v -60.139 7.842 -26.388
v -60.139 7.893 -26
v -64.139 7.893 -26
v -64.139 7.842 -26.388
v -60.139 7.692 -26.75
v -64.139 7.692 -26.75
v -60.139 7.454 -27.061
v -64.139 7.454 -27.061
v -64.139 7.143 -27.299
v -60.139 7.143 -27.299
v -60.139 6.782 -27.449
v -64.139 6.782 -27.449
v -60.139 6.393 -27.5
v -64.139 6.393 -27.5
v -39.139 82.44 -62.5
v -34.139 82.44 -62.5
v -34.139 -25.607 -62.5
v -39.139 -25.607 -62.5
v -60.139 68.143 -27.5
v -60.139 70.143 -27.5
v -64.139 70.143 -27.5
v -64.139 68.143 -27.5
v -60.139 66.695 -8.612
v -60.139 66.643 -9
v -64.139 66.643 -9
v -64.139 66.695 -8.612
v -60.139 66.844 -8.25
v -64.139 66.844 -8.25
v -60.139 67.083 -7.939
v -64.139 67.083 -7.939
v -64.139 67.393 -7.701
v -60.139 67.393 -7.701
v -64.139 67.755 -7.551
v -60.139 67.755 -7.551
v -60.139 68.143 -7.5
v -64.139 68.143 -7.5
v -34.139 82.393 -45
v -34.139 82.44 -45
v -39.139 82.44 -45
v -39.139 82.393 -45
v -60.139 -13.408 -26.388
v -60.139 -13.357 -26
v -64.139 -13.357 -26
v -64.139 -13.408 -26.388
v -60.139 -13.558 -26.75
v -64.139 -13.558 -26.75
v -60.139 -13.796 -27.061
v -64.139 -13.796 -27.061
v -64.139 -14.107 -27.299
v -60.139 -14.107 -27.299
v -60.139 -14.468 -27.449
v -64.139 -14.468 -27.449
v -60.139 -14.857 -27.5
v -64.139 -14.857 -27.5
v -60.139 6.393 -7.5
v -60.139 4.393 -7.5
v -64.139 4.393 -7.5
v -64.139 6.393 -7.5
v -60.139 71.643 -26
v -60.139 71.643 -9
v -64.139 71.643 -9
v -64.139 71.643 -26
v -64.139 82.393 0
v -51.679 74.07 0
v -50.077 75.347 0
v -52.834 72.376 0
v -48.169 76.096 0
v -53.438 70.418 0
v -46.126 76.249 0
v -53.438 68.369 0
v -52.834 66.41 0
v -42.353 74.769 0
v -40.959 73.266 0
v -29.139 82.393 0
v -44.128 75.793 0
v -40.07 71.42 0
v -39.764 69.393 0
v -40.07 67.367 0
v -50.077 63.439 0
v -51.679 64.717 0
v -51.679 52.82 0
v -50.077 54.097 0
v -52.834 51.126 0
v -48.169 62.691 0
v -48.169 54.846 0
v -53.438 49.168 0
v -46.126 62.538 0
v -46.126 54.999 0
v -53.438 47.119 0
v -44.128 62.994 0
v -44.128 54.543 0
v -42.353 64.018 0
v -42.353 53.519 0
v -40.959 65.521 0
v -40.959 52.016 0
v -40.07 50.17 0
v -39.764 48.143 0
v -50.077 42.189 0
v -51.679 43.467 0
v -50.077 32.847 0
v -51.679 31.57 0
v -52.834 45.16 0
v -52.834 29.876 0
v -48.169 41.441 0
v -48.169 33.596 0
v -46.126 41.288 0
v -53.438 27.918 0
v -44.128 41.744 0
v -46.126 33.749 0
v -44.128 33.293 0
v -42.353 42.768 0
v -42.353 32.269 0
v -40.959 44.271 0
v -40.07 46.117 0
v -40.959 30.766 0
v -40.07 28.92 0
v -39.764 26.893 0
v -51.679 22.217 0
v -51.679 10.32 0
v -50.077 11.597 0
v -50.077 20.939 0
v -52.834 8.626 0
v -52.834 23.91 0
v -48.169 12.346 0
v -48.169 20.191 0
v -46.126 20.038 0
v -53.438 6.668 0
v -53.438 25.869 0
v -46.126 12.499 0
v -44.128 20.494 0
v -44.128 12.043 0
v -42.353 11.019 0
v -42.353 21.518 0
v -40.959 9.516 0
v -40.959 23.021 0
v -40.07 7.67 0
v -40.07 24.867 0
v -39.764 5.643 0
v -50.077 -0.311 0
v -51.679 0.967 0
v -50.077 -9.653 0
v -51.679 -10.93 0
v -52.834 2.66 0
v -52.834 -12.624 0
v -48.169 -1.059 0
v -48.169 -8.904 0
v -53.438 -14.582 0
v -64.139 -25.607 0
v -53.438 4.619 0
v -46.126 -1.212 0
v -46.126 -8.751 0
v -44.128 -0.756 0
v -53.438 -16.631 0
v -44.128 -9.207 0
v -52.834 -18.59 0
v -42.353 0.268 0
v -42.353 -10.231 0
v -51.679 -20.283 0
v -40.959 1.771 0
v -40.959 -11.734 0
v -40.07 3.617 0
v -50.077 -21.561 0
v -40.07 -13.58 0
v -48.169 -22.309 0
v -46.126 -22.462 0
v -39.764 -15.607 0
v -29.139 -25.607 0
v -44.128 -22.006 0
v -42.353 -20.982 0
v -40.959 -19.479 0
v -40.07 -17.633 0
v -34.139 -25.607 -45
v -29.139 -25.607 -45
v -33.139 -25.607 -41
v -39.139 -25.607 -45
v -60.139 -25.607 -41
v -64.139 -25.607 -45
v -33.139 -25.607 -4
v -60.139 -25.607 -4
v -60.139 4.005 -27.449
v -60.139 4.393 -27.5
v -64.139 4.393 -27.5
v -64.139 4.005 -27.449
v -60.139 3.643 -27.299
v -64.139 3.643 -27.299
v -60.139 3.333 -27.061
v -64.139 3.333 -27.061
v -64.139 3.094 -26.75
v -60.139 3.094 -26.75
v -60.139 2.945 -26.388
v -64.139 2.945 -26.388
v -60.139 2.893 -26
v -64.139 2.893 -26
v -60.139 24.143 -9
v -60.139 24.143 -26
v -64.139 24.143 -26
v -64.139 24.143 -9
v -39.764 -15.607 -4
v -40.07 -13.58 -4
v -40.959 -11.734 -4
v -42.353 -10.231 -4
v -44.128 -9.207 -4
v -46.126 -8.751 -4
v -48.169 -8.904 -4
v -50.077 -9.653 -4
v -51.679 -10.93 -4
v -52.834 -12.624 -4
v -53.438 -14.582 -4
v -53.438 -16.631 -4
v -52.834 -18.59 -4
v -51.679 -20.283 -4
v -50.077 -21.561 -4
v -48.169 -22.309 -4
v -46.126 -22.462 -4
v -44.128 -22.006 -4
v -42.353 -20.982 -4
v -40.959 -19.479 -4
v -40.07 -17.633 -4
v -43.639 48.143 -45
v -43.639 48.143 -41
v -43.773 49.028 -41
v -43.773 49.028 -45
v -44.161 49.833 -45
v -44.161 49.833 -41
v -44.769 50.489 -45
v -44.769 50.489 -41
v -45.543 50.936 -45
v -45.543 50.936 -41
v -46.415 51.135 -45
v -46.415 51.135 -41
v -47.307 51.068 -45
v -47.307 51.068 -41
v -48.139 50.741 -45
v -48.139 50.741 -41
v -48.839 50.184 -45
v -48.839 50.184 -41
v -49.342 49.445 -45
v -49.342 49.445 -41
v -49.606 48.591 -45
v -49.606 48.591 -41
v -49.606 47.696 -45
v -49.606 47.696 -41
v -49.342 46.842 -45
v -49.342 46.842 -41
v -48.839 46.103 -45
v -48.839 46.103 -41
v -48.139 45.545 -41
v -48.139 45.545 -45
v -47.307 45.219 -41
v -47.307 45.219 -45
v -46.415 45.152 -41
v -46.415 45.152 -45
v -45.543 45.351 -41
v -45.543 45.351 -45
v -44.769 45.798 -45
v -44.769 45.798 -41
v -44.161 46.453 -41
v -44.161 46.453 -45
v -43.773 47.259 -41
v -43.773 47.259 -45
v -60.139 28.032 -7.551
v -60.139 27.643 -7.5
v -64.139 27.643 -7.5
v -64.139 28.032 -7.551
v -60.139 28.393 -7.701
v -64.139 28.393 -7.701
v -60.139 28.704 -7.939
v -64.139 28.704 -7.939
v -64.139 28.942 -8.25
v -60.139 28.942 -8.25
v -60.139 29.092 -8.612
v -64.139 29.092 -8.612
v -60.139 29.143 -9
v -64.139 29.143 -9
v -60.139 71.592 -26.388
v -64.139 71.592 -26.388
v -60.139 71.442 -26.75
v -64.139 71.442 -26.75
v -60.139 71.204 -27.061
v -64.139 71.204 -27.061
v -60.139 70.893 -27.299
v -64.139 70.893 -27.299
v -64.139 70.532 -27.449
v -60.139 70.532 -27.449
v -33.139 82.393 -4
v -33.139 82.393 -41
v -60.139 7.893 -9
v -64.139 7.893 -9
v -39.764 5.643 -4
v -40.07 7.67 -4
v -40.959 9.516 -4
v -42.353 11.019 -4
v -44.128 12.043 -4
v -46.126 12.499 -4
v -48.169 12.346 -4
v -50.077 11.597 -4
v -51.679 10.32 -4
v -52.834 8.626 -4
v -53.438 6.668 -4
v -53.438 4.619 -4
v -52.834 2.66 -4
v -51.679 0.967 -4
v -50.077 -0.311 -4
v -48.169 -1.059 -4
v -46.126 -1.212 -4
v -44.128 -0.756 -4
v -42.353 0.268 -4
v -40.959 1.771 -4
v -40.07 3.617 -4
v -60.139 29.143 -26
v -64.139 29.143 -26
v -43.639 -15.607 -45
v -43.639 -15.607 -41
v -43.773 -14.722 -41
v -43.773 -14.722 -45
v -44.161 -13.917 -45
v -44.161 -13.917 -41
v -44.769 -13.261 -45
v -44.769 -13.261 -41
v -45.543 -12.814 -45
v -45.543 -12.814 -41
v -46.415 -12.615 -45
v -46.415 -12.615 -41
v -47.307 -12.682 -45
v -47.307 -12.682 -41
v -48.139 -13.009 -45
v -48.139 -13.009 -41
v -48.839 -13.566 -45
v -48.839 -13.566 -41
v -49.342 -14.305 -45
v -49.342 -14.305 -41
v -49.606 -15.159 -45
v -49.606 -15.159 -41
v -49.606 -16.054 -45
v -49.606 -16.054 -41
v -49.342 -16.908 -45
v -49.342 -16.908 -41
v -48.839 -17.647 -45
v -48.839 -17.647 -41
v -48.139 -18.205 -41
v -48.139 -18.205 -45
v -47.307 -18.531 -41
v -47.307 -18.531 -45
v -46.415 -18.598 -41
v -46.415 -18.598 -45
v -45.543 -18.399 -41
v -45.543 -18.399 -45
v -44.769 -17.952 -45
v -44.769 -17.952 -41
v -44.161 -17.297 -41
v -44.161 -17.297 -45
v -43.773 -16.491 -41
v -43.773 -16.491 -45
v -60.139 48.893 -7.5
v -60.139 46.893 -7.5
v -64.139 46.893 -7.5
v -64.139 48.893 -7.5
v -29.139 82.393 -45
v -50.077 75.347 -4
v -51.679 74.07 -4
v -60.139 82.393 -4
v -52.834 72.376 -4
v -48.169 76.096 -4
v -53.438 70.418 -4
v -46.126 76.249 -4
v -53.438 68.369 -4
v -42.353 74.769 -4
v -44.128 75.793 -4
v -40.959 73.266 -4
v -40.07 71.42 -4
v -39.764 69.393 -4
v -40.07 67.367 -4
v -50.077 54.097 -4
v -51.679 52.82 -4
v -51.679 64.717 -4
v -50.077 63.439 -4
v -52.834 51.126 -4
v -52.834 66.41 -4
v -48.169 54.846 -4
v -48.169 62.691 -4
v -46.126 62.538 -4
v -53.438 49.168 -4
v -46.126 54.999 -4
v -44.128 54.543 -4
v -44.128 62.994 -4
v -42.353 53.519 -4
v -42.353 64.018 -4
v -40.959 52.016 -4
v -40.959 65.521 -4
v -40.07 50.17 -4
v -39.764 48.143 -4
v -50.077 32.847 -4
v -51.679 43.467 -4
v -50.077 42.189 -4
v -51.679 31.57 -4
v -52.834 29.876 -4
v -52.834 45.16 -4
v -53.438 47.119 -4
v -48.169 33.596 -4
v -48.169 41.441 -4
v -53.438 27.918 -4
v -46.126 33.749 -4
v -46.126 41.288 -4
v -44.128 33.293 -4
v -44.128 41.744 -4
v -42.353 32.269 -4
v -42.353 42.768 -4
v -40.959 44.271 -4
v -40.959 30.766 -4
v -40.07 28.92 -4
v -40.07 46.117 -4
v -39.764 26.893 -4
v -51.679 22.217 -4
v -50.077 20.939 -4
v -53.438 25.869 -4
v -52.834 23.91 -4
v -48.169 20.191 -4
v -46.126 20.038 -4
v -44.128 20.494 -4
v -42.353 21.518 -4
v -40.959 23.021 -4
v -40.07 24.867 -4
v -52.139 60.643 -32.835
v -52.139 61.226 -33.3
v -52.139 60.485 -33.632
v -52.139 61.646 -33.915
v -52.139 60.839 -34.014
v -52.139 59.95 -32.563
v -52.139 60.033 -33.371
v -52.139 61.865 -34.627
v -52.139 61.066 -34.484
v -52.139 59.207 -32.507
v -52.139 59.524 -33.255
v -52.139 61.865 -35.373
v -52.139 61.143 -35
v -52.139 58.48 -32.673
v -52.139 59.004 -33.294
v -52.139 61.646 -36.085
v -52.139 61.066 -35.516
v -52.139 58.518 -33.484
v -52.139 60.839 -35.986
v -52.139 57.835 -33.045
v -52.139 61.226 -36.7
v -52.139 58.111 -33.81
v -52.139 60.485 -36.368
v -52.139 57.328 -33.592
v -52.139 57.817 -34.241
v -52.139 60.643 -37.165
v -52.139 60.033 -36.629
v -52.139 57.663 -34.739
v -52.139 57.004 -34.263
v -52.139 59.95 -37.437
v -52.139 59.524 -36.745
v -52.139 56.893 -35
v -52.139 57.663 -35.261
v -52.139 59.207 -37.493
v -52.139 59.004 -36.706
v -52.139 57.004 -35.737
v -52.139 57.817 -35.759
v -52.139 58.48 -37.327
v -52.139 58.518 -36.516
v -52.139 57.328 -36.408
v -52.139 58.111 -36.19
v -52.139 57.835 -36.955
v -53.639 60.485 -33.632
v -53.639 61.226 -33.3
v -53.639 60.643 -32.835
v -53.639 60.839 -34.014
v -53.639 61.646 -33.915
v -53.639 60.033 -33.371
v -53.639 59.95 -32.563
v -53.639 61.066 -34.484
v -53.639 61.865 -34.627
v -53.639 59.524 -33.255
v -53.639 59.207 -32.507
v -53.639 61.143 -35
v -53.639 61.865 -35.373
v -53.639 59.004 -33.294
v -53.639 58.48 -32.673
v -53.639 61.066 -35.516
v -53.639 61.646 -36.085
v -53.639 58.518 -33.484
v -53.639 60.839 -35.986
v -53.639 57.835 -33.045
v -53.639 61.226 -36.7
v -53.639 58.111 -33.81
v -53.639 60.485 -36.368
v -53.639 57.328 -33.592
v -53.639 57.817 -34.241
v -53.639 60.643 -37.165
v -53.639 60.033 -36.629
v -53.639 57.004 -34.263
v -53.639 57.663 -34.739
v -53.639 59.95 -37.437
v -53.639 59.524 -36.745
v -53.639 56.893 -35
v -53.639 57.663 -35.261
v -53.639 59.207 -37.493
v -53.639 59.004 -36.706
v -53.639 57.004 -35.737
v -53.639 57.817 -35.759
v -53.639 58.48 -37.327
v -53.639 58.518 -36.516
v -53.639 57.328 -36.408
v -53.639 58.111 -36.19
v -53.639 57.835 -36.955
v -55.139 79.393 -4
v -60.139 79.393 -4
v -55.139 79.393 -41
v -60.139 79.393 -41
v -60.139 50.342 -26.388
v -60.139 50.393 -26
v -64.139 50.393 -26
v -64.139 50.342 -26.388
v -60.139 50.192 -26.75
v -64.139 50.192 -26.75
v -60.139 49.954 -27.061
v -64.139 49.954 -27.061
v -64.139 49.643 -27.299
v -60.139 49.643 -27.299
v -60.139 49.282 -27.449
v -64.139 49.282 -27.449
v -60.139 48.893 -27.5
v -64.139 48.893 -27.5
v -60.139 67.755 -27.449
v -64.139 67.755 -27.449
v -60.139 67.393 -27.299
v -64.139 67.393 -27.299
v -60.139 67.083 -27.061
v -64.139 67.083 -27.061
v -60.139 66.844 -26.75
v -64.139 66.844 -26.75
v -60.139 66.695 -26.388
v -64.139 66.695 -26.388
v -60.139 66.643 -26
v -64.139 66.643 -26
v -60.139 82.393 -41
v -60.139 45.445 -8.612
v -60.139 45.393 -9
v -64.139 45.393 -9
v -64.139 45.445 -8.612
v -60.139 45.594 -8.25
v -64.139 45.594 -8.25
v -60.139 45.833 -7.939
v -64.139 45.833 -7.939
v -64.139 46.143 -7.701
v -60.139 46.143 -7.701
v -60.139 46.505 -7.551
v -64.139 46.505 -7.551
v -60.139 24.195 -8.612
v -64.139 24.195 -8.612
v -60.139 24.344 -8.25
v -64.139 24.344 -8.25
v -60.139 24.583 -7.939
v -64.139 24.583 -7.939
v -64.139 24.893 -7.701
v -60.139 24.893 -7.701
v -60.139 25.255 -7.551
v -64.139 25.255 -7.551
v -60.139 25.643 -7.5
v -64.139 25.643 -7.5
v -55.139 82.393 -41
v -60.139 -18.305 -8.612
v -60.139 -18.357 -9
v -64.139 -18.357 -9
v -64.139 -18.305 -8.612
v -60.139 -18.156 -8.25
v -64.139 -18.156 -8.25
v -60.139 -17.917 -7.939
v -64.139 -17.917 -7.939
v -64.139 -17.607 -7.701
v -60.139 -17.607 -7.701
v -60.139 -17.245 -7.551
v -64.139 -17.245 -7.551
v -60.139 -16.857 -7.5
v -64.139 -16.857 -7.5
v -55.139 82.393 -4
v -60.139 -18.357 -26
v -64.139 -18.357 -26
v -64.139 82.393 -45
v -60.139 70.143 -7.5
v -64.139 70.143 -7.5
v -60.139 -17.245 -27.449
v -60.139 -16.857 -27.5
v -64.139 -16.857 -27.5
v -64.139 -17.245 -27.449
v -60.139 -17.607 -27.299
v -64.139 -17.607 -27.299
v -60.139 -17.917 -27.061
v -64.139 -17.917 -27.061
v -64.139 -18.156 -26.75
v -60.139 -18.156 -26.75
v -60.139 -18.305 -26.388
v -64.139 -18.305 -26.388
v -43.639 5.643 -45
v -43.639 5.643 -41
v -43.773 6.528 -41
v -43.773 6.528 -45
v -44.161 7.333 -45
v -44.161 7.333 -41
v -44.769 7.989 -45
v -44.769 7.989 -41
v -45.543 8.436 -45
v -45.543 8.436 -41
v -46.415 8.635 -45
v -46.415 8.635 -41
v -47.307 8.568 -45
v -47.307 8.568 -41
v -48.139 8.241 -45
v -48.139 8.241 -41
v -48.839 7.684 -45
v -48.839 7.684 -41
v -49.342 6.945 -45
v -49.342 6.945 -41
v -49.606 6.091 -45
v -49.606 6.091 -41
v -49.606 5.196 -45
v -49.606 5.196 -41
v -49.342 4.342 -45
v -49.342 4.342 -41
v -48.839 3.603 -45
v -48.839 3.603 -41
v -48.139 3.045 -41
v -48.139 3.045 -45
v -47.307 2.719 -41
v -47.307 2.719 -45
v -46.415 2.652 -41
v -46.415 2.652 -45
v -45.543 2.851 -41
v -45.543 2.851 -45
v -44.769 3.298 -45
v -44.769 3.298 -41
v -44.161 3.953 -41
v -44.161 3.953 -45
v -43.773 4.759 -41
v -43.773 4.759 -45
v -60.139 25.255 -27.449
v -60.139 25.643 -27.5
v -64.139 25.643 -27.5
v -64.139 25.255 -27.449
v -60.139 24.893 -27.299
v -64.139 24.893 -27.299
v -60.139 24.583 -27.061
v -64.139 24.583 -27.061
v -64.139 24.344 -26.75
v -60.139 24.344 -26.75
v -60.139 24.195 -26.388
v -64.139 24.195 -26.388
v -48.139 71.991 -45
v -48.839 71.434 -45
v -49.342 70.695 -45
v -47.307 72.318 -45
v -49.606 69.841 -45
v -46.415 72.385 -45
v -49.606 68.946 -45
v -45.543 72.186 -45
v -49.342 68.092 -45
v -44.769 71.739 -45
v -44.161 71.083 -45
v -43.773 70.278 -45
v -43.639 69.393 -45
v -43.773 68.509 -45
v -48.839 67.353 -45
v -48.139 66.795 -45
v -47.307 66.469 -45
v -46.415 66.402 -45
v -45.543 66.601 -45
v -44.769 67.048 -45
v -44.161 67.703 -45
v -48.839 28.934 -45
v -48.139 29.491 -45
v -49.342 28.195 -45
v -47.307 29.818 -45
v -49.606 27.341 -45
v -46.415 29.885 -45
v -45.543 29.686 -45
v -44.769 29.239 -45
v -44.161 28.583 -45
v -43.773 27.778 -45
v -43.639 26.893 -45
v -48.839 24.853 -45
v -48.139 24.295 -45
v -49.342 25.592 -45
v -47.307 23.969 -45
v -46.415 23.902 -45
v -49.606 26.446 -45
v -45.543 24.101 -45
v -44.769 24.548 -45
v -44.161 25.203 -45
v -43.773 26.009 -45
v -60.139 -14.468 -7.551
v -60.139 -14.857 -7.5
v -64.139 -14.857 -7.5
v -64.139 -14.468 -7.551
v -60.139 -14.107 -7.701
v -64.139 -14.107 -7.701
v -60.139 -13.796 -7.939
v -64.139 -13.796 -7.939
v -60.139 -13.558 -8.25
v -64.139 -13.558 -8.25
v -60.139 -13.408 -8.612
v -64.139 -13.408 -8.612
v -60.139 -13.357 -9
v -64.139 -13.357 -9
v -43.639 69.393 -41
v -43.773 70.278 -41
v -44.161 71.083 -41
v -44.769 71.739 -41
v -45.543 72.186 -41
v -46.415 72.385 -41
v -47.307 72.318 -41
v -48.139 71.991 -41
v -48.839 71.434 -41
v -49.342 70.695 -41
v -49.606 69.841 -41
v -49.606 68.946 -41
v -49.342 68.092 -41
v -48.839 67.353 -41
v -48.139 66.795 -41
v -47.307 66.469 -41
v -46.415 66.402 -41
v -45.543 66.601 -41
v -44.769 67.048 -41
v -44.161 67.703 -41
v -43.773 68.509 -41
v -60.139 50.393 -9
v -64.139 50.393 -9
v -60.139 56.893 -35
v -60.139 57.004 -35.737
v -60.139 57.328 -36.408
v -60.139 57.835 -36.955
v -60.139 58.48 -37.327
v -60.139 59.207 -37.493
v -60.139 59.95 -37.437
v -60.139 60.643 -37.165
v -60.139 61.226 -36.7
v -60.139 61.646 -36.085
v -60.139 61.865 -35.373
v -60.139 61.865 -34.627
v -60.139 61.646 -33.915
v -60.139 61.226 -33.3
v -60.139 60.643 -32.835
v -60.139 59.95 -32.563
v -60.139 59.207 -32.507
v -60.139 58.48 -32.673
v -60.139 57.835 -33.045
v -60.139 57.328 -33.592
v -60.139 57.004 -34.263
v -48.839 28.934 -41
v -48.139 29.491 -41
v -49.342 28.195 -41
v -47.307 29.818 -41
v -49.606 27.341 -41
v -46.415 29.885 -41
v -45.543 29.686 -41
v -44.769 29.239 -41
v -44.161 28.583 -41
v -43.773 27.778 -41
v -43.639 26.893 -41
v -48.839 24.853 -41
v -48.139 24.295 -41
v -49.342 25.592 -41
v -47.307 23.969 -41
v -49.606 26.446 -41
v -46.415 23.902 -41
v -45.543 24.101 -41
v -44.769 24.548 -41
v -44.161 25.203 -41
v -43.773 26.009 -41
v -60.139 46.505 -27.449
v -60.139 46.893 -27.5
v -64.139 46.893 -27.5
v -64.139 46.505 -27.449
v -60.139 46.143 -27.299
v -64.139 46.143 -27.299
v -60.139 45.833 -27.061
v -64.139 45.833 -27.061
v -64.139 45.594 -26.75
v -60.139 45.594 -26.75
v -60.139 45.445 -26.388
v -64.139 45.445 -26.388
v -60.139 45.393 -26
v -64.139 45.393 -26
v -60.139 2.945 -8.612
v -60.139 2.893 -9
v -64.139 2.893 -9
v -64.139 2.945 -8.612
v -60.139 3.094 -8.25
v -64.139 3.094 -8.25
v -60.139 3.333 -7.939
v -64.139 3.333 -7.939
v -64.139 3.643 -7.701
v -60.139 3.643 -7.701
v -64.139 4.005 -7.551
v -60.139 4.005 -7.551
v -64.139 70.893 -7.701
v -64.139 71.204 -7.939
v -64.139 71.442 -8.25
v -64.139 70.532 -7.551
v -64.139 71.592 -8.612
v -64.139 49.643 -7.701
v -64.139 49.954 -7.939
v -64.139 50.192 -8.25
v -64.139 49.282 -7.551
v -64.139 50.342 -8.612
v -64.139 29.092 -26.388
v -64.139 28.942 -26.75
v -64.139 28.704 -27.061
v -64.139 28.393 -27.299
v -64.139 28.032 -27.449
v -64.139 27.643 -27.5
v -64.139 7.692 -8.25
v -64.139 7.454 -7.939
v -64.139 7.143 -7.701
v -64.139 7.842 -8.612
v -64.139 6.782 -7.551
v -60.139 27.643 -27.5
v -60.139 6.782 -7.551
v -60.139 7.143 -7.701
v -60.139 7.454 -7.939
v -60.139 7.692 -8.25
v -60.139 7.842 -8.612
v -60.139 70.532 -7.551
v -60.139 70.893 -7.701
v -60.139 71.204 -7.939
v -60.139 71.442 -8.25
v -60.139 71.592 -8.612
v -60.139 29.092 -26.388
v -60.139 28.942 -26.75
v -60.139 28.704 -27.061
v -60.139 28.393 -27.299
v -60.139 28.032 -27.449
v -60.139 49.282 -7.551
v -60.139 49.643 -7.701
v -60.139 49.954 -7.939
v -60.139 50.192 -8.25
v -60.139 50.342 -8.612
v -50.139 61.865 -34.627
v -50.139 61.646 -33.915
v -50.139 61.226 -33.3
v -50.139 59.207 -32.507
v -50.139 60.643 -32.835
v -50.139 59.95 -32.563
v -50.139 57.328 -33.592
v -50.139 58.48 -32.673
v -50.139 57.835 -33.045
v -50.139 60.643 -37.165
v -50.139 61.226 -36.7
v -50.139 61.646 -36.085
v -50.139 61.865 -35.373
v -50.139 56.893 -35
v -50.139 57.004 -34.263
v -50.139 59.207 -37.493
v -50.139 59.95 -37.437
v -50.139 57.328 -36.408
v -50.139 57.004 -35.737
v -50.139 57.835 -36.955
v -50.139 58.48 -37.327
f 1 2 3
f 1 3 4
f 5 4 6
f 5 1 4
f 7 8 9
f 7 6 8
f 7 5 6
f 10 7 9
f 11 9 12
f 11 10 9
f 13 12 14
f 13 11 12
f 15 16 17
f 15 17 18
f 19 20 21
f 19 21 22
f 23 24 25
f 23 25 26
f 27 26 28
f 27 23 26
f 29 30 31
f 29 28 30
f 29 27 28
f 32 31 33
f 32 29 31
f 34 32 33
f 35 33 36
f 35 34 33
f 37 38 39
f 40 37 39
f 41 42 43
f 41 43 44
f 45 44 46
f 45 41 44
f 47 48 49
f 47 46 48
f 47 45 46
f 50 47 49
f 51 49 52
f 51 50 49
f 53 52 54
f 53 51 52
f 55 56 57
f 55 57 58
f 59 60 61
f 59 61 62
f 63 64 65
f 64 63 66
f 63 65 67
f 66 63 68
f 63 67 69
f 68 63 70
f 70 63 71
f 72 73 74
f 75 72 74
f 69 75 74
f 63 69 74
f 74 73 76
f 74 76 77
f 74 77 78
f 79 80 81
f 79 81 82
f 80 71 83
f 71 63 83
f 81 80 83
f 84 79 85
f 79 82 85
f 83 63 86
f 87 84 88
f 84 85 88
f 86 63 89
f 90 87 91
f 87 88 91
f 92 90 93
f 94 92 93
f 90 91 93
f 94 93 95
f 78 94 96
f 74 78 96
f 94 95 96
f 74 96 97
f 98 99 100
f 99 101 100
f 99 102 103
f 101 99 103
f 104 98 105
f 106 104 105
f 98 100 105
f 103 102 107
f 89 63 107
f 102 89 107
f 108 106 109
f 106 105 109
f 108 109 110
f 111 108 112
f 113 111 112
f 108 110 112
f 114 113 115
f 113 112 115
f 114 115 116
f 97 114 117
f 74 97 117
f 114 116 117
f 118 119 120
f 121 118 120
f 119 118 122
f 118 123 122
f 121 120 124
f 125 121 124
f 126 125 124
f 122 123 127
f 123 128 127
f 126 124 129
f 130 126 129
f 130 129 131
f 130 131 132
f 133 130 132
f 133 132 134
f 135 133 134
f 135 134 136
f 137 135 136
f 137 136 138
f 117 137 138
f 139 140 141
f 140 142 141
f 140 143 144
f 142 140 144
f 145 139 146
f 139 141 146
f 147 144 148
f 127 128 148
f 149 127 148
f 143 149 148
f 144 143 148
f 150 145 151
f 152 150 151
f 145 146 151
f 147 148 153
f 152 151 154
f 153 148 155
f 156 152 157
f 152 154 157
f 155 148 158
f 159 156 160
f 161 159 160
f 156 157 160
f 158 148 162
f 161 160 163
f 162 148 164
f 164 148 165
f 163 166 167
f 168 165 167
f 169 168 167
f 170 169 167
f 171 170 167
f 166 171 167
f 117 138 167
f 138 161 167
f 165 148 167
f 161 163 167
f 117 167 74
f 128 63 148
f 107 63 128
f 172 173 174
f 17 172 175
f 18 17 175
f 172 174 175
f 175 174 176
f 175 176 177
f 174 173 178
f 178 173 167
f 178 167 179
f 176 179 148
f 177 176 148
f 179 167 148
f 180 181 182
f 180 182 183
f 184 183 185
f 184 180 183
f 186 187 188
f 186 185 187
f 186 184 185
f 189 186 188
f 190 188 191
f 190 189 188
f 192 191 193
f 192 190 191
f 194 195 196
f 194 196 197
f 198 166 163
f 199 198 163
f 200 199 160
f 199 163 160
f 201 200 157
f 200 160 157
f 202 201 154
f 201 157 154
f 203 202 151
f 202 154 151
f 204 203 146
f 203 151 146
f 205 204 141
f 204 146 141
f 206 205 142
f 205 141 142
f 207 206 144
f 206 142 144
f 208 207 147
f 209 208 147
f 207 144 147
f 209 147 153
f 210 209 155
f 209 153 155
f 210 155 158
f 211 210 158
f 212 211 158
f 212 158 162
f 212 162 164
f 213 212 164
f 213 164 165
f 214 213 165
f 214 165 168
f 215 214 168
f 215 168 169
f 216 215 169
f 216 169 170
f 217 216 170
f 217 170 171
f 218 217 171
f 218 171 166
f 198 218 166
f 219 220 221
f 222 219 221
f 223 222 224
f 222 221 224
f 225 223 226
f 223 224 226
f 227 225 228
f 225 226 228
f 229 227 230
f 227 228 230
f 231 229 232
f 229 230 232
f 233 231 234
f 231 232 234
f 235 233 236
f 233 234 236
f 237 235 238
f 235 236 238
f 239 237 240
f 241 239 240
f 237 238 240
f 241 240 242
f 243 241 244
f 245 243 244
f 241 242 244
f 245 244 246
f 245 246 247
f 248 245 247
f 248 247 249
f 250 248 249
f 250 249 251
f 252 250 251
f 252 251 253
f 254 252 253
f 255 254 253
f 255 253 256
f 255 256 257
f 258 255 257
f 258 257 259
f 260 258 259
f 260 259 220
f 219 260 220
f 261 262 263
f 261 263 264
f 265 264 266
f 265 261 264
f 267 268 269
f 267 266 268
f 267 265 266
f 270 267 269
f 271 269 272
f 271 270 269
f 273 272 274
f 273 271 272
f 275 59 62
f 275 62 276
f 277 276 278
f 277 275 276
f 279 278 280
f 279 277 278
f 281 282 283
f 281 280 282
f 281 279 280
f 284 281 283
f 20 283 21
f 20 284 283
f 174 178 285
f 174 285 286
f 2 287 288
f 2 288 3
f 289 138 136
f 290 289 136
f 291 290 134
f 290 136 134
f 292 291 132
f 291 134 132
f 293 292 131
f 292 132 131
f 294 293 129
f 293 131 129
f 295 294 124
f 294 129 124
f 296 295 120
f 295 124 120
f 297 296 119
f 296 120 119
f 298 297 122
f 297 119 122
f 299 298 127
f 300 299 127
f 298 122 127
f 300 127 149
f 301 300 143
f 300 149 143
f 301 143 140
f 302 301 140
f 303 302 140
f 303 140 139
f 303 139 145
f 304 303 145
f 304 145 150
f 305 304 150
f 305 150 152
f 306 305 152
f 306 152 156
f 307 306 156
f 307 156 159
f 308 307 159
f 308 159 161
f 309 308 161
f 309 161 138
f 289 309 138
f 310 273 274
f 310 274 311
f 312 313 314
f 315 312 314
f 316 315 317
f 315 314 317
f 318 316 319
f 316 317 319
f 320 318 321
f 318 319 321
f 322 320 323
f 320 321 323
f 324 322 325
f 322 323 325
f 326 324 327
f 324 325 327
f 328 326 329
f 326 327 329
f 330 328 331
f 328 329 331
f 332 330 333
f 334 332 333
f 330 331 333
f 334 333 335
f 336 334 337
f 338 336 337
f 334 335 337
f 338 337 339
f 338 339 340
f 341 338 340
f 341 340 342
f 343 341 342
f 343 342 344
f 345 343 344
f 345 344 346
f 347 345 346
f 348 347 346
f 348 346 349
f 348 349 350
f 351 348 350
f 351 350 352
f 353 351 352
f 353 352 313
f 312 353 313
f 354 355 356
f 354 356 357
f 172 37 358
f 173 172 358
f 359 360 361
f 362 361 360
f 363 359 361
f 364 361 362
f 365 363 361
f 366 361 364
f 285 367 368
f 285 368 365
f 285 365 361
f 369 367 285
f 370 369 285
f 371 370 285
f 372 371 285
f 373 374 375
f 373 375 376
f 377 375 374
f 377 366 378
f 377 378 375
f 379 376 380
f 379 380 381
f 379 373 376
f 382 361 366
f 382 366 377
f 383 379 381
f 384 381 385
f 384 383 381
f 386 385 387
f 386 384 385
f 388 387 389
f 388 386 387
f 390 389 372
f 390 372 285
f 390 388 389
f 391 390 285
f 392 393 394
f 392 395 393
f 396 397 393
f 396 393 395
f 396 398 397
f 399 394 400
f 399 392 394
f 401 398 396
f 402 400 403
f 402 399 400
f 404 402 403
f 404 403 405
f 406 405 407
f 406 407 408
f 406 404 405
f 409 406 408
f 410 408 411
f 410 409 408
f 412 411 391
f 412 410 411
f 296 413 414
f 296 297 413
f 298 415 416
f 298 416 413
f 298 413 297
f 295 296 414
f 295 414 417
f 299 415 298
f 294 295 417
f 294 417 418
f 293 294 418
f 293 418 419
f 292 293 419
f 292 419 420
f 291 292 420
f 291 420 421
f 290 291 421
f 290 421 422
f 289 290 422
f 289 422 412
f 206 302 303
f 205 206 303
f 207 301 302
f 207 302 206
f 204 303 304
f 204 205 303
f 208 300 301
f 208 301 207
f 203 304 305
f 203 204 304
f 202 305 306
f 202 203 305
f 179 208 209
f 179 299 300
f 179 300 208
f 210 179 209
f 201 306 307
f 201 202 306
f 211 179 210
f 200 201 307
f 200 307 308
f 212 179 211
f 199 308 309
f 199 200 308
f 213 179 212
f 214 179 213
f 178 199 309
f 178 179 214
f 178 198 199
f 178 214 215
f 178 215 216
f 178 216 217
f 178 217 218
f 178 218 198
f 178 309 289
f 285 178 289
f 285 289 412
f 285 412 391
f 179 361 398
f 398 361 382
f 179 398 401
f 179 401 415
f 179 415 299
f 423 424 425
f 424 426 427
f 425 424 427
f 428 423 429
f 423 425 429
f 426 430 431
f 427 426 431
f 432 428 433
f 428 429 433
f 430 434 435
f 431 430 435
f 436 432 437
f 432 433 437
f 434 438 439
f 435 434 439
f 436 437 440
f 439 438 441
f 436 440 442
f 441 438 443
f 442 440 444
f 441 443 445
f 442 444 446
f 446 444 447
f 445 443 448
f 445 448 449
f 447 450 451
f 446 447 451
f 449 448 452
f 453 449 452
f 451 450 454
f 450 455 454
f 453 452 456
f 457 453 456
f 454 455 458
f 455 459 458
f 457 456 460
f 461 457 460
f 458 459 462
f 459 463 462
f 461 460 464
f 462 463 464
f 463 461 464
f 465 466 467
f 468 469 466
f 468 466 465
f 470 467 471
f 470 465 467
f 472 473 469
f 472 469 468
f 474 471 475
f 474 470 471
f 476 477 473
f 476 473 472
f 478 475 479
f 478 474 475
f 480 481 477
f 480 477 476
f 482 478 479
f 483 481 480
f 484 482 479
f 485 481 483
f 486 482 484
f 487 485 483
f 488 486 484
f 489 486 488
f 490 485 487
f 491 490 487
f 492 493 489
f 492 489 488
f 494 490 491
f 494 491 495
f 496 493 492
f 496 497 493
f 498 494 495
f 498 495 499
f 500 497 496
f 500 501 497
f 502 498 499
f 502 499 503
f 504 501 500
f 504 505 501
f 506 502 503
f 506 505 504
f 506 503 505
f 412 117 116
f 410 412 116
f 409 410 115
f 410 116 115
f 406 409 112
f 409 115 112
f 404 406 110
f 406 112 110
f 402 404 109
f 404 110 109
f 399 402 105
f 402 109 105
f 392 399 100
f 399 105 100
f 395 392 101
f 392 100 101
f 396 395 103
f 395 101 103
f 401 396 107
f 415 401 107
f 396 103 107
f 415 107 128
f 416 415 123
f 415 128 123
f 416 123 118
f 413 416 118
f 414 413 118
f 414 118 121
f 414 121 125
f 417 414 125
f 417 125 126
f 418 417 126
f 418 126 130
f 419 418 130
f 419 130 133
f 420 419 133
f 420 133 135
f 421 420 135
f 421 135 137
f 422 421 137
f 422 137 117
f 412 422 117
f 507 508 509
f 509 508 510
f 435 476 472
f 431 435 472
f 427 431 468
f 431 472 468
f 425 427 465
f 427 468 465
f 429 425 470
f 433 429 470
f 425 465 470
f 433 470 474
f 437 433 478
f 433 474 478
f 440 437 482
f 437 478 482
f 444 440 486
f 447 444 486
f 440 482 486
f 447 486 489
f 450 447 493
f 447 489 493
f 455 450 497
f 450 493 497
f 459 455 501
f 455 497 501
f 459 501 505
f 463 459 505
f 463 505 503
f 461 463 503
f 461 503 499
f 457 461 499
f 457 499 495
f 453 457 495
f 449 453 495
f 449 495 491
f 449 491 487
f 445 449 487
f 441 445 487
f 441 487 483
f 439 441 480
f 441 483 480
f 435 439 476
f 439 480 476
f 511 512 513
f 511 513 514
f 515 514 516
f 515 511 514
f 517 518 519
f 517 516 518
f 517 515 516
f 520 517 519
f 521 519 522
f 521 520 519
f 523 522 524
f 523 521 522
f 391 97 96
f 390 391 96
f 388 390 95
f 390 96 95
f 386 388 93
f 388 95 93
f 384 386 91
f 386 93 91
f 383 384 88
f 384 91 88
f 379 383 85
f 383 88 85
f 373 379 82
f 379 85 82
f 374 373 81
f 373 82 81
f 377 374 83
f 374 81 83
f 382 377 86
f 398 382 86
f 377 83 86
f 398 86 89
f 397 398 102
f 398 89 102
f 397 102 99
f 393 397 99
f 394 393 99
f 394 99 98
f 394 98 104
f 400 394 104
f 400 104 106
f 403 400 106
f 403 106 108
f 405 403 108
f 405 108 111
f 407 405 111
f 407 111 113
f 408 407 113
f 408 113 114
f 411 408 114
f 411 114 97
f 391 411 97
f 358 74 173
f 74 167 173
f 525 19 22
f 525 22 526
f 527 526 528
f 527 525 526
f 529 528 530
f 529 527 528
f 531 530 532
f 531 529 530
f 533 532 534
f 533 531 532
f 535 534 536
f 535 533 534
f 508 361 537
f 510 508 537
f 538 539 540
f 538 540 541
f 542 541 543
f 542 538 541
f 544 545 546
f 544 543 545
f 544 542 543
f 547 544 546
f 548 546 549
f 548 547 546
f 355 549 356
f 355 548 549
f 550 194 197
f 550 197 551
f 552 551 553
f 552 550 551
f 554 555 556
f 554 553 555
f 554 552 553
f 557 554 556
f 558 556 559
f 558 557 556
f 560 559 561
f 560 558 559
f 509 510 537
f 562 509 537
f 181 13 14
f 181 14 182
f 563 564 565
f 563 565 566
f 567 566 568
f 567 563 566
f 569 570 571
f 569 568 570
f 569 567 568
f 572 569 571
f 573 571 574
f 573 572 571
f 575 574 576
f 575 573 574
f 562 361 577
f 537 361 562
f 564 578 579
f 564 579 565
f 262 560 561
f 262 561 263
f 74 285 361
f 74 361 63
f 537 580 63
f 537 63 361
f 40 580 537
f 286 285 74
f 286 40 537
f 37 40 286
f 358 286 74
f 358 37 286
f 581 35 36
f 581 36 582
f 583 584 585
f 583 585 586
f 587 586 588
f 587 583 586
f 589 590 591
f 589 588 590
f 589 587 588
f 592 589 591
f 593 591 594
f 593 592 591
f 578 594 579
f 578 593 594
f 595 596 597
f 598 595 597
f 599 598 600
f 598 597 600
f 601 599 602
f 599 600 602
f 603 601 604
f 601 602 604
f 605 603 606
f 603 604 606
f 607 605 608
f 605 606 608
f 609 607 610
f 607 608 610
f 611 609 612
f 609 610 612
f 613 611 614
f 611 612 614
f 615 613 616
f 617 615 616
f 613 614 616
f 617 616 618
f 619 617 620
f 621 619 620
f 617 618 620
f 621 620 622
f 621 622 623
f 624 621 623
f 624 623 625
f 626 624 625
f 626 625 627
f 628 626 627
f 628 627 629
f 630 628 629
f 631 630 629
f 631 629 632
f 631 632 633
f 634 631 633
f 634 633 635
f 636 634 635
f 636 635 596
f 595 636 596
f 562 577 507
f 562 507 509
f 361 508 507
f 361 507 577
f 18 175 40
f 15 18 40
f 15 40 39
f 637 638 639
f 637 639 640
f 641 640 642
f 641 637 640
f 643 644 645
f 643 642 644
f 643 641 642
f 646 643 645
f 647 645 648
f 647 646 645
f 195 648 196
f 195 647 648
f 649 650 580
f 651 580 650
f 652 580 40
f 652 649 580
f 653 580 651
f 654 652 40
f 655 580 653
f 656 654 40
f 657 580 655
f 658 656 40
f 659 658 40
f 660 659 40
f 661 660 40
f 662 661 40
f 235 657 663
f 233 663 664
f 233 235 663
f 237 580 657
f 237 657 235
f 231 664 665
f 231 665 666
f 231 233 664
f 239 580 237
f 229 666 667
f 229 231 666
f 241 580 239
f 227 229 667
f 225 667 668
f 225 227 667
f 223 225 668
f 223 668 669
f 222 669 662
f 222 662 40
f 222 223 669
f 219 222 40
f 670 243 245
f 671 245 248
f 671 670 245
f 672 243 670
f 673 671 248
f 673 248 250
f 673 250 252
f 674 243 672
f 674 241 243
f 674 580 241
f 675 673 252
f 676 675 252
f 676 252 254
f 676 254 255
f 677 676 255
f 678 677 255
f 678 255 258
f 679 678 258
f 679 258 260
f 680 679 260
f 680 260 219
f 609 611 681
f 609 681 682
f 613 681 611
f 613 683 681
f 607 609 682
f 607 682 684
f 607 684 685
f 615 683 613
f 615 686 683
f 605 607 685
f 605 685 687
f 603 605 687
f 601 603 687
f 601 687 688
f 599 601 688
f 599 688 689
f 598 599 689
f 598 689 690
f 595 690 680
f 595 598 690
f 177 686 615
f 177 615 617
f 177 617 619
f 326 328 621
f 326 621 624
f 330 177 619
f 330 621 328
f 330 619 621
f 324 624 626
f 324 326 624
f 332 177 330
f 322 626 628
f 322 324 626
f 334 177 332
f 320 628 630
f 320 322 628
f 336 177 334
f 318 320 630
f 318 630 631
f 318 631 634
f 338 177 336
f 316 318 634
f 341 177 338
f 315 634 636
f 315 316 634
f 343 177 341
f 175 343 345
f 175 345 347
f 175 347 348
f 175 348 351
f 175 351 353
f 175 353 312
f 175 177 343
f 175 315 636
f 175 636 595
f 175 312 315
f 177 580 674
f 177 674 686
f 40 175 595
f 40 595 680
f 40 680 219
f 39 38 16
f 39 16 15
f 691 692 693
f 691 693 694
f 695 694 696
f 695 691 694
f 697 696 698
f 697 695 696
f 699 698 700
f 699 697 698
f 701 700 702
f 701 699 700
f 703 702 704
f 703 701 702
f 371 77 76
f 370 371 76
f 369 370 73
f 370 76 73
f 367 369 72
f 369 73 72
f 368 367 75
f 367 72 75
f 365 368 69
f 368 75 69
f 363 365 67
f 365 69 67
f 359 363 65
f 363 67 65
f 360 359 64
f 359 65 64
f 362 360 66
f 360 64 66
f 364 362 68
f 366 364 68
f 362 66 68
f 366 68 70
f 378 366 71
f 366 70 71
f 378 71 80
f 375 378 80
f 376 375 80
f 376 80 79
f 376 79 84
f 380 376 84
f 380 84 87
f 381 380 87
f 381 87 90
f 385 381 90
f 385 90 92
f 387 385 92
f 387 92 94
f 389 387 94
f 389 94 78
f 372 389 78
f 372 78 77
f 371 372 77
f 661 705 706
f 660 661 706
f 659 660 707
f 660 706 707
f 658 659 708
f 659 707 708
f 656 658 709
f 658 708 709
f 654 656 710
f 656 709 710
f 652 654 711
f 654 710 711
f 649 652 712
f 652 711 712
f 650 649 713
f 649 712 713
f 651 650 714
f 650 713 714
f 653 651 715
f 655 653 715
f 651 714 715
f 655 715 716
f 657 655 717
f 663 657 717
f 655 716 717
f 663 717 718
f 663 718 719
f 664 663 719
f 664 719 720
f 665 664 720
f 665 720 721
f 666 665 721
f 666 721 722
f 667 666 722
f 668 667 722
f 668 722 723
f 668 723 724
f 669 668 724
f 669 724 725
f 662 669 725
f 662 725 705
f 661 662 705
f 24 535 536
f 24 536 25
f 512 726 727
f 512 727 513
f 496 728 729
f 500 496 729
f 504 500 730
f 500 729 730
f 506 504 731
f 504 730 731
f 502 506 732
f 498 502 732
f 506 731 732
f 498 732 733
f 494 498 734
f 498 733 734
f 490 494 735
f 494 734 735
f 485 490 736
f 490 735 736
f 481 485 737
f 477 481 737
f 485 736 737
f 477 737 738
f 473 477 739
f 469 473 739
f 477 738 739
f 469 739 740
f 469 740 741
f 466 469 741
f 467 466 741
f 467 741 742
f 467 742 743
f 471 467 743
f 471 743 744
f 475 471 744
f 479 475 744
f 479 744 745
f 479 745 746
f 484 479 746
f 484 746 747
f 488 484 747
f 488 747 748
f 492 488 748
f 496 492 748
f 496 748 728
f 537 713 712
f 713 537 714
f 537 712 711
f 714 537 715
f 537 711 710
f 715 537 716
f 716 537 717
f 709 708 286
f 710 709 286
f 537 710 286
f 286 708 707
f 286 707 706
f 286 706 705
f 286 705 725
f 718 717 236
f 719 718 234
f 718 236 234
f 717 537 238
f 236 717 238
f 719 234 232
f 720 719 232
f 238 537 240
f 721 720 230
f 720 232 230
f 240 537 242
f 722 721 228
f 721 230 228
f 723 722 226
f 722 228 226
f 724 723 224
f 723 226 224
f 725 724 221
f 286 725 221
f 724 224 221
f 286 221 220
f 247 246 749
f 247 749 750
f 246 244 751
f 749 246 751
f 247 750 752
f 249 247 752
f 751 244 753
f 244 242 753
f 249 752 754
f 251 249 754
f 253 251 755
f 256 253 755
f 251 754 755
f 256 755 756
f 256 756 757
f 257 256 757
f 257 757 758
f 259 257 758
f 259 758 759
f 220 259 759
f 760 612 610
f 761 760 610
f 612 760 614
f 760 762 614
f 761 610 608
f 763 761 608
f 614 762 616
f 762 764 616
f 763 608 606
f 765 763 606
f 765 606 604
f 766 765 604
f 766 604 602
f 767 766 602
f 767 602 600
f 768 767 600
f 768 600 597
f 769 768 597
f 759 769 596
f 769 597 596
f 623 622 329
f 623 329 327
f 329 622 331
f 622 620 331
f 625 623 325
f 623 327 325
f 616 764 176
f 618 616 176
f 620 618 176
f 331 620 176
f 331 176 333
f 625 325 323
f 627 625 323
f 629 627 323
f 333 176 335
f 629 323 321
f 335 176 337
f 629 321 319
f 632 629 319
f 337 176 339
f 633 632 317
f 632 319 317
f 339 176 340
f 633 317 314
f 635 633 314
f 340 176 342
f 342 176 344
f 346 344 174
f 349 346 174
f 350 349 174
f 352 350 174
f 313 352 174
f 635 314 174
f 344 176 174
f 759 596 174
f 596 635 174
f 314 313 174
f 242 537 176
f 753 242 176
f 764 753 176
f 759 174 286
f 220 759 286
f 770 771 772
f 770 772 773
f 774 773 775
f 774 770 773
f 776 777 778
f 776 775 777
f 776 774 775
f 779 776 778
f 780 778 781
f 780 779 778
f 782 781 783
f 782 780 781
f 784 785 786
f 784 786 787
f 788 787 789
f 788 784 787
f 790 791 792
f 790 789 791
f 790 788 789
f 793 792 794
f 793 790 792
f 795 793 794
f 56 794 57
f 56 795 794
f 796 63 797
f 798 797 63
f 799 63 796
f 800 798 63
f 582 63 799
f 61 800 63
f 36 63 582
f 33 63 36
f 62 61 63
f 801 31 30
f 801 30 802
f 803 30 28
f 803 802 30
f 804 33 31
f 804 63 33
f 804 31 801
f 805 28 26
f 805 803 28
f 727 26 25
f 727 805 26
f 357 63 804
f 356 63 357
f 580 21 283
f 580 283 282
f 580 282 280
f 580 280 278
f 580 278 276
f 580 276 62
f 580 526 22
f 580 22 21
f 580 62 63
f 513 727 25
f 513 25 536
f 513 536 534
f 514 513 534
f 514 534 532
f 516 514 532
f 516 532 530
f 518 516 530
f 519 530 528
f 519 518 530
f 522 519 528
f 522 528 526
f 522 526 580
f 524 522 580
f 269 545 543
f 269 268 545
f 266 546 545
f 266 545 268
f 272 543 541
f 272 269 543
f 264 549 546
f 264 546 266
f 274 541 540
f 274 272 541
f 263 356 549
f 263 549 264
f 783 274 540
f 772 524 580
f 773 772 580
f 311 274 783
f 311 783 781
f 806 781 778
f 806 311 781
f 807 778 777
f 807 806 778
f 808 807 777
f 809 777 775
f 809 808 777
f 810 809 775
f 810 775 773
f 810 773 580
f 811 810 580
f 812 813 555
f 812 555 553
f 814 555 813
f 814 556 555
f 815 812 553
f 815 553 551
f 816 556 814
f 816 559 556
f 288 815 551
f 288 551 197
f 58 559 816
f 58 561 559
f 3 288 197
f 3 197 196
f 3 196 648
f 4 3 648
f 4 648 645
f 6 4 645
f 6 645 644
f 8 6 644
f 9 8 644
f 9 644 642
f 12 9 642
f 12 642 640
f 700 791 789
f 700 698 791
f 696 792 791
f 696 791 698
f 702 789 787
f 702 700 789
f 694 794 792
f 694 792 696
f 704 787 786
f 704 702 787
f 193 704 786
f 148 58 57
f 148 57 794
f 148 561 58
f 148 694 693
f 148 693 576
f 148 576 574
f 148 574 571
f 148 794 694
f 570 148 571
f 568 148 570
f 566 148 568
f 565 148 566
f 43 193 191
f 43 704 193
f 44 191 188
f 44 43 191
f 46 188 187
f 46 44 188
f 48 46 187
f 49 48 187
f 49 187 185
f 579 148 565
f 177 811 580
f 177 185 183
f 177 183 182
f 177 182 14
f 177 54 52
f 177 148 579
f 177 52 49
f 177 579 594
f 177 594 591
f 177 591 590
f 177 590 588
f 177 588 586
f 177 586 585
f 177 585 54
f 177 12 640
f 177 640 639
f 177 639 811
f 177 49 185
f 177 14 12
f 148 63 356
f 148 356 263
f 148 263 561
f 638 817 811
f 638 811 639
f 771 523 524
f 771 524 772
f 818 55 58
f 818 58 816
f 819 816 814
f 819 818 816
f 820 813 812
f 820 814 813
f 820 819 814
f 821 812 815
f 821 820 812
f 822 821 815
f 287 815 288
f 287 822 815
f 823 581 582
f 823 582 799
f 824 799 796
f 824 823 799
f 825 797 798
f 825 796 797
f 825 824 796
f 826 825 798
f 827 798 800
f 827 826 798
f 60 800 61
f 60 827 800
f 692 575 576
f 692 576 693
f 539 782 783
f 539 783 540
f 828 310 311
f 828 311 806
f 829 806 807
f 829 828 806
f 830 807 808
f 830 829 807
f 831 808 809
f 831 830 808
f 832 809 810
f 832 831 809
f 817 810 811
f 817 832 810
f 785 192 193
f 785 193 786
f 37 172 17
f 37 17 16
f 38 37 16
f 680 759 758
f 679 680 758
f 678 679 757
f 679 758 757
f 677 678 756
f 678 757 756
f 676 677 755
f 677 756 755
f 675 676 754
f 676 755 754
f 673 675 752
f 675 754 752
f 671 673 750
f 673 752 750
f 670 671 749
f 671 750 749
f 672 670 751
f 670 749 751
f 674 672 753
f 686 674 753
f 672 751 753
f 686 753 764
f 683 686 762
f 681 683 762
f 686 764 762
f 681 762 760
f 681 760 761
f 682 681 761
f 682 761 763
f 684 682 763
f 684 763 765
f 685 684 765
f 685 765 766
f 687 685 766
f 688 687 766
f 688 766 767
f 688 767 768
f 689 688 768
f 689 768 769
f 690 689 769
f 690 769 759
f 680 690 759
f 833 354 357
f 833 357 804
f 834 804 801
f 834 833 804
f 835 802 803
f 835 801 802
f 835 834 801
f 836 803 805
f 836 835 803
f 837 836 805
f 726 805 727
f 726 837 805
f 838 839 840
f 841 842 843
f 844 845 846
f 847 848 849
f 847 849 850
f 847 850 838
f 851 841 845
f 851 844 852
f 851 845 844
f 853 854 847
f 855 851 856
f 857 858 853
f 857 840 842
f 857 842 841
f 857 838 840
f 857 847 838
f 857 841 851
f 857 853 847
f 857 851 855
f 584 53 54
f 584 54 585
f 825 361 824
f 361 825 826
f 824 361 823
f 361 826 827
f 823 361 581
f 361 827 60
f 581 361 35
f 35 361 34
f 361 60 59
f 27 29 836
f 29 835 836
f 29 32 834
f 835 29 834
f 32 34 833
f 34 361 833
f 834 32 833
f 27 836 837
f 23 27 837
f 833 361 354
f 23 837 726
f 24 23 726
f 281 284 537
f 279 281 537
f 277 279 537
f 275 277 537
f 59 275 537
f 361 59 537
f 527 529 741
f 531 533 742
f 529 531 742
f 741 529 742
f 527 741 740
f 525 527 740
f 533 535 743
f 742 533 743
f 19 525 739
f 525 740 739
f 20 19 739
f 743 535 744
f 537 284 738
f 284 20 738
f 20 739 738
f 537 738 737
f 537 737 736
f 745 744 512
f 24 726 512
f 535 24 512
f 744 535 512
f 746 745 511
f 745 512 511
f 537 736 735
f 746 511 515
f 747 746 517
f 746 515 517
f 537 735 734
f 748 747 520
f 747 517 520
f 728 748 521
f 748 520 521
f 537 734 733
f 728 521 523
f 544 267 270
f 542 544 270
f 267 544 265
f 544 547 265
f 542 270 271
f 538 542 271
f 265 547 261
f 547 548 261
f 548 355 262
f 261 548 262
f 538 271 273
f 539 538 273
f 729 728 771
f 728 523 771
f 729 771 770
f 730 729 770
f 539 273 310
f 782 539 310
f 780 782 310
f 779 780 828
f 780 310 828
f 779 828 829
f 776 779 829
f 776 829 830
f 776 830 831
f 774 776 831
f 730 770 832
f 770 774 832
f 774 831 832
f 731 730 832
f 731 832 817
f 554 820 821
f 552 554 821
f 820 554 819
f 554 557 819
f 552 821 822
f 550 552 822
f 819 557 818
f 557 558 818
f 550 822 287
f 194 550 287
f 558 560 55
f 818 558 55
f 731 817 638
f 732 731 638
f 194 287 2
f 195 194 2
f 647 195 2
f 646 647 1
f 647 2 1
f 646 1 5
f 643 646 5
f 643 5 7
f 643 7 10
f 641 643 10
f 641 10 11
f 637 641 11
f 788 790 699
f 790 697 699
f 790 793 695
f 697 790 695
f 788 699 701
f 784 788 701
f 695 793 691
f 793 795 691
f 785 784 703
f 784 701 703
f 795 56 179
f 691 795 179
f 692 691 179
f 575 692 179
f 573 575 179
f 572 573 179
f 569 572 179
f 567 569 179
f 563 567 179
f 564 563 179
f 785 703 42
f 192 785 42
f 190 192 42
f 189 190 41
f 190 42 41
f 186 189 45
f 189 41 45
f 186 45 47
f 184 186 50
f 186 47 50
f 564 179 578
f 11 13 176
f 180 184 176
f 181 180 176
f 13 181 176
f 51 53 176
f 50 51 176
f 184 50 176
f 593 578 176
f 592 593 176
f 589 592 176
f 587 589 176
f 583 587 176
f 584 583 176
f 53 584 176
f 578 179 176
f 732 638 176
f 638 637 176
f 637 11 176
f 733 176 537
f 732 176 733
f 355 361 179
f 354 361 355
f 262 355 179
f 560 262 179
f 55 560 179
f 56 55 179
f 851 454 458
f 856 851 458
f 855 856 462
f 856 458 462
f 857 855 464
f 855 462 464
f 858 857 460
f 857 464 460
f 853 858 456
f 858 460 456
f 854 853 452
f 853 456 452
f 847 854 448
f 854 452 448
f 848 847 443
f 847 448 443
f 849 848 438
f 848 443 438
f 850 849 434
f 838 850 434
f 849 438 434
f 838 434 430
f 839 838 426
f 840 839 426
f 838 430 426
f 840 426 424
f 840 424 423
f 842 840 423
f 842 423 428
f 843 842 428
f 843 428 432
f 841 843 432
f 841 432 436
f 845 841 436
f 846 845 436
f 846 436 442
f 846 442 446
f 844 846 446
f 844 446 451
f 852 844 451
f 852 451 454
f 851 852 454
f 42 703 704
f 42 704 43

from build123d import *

# Parameters (mm, degrees)
SKETCH2_W           = 35
SKETCH2_H           = 105
BOSS_EXTRUDE1_DEPTH = 45
CUT_EXTRUDE1_REACH  = 133.011
SKETCH3_W           = 27
SKETCH3_H           = 37
SKETCH4_R           = 6.875
CUT_EXTRUDE2_DEPTH  = 10
SKETCH14_R          = 2.5
BOSS_EXTRUDE2_DEPTH = 10
CUT_EXTRUDE7_START  = -3.5
SKETCH15_R          = 2.5
SKETCH15_R_2        = 1.75
CUT_EXTRUDE7_DEPTH  = 1.5
SKETCH16_W          = 37
SKETCH16_H          = 3
BOSS_EXTRUDE4_DEPTH = 5
SKETCH17_W          = 35
SKETCH17_H          = 45
SKETCH17_W_2        = 27
SKETCH17_H_2        = 37
BOSS_EXTRUDE5_DEPTH = 3
SKETCH18_R          = 3
CUT_EXTRUDE8_DEPTH  = 10
CUT_EXTRUDE9_START  = -30
CUT_EXTRUDE9_DEPTH  = 10
SKETCH19_W          = 5
SKETCH19_H          = 108.046697757
BOSS_EXTRUDE6_DEPTH = 17.5


with BuildPart() as part:
    # Sketch2 → Boss-Extrude1 (new body)
    with BuildSketch(Plane.XY):
        with Locations((-46.639483312, 26.893418081)):
            Rectangle(SKETCH2_W, SKETCH2_H)
    extrude(amount=-BOSS_EXTRUDE1_DEPTH)

    # Sketch3 → Cut-Extrude1 (cut, up to next)
    with BuildSketch(Plane(origin=(0, 79.393418081, 0), x_dir=(1, 0, 0), z_dir=(0, 1, 0)), mode=Mode.PRIVATE) as cut_extrude1_sk1:
        with Locations((-46.639483312, 22.5)):
            Rectangle(SKETCH3_W, SKETCH3_H)
    cut_extrude1_tool1 = extrude(cut_extrude1_sk1.sketch, amount=-CUT_EXTRUDE1_REACH, mode=Mode.PRIVATE) & part.part
    add(cut_extrude1_tool1.solids().sort_by_distance((-46.639483, 79.393418, -22.5))[0], mode=Mode.SUBTRACT)

    # Sketch4 → Cut-Extrude2 (cut)
    with BuildSketch(Plane.XY):
        with Locations((-46.639483312, 69.393418081)):
            Circle(SKETCH4_R)
        with Locations((-46.639483312, 48.143418081)):
            Circle(SKETCH4_R)
        with Locations((-46.639483312, 26.893418081)):
            Circle(SKETCH4_R)
        with Locations((-46.639483312, 5.643418081)):
            Circle(SKETCH4_R)
        with Locations((-46.639483312, -15.606581919)):
            Circle(SKETCH4_R)
    extrude(amount=-CUT_EXTRUDE2_DEPTH, mode=Mode.SUBTRACT)

    # Sketch14 → Boss-Extrude2 (add)
    with BuildSketch(Plane(origin=(-60.139483312, 0, 0), x_dir=(0, 0, -1), z_dir=(1, 0, 0))):
        with Locations(Location((35, 59.393418081, 0), (0, 0, 270))):
            Circle(SKETCH14_R)
    extrude(amount=BOSS_EXTRUDE2_DEPTH)

    # Sketch15 → Cut-Extrude7 (cut)
    with BuildSketch(Plane(origin=(-50.139483312, 0, 0), x_dir=(0, 0, -1), z_dir=(1, 0, 0)).offset(CUT_EXTRUDE7_START)):
        with Locations(Location((35, 59.393418081, 0), (0, 0, 270))):
            Circle(SKETCH15_R)
        with Locations(Location((35, 59.393418081, 0), (0, 0, 90))):
            Circle(SKETCH15_R_2, mode=Mode.SUBTRACT)
    extrude(amount=CUT_EXTRUDE7_DEPTH, mode=Mode.SUBTRACT)

    # Sketch17 → Boss-Extrude5 (add)
    with BuildSketch(Plane(origin=(0, 79.393418081, 0), x_dir=(1, 0, 0), z_dir=(0, 1, 0))):
        with Locations((-46.639483312, 22.5)):
            Rectangle(SKETCH17_W, SKETCH17_H)
        with Locations((-46.639483312, 22.5)):
            Rectangle(SKETCH17_W_2, SKETCH17_H_2, mode=Mode.SUBTRACT)
    extrude(amount=BOSS_EXTRUDE5_DEPTH)

    # Sketch18 → Cut-Extrude8 (cut)
    with BuildSketch(Plane.XY.offset(-41)):
        with Locations((-46.639483312, 69.393418081)):
            Circle(SKETCH18_R)
        with Locations((-46.639483312, 48.143418081)):
            Circle(SKETCH18_R)
        with Locations((-46.639483312, 26.893418081)):
            Circle(SKETCH18_R)
        with Locations((-46.639483312, 5.643418081)):
            Circle(SKETCH18_R)
        with Locations((-46.639483312, -15.606581919)):
            Circle(SKETCH18_R)
    extrude(amount=-CUT_EXTRUDE8_DEPTH, mode=Mode.SUBTRACT)

    # Sketch12 → Cut-Extrude9 (cut)
    with BuildSketch(Plane(origin=(-29.139483312, 0, 0), x_dir=(0, 0, -1), z_dir=(1, 0, 0)).offset(CUT_EXTRUDE9_START)):
        with BuildLine():
            Line((9, 7.893418081), (26, 7.893418081))
            ThreePointArc((26, 7.893418081), (27.060660172, 7.454078252), (27.5, 6.393418081))
            Line((27.5, 6.393418081), (27.5, 4.393418081))
            ThreePointArc((27.5, 4.393418081), (27.060660172, 3.332757909), (26, 2.893418081))
            Line((26, 2.893418081), (9, 2.893418081))
            ThreePointArc((9, 2.893418081), (7.939339828, 3.332757909), (7.5, 4.393418081))
            Line((7.5, 4.393418081), (7.5, 6.393418081))
            ThreePointArc((7.5, 6.393418081), (7.939339828, 7.454078252), (9, 7.893418081))
        make_face()
        with BuildLine():
            Line((9, 29.143418081), (26, 29.143418081))
            ThreePointArc((26, 29.143418081), (27.060660172, 28.704078252), (27.5, 27.643418081))
            Line((27.5, 27.643418081), (27.5, 25.643418081))
            ThreePointArc((27.5, 25.643418081), (27.060660172, 24.582757909), (26, 24.143418081))
            Line((26, 24.143418081), (9, 24.143418081))
            ThreePointArc((9, 24.143418081), (7.939339828, 24.582757909), (7.5, 25.643418081))
            Line((7.5, 25.643418081), (7.5, 27.643418081))
            ThreePointArc((7.5, 27.643418081), (7.939339828, 28.704078252), (9, 29.143418081))
        make_face()
        with BuildLine():
            Line((9, 50.393418081), (26, 50.393418081))
            ThreePointArc((26, 50.393418081), (27.060660172, 49.954078252), (27.5, 48.893418081))
            Line((27.5, 48.893418081), (27.5, 46.893418081))
            ThreePointArc((27.5, 46.893418081), (27.060660172, 45.832757909), (26, 45.393418081))
            Line((26, 45.393418081), (9, 45.393418081))
            ThreePointArc((9, 45.393418081), (7.939339828, 45.832757909), (7.5, 46.893418081))
            Line((7.5, 46.893418081), (7.5, 48.893418081))
            ThreePointArc((7.5, 48.893418081), (7.939339828, 49.954078252), (9, 50.393418081))
        make_face()
        with BuildLine():
            Line((9, 71.643418081), (26, 71.643418081))
            ThreePointArc((26, 71.643418081), (27.060660172, 71.204078252), (27.5, 70.143418081))
            Line((27.5, 70.143418081), (27.5, 68.143418081))
            ThreePointArc((27.5, 68.143418081), (27.060660172, 67.082757909), (26, 66.643418081))
            Line((26, 66.643418081), (9, 66.643418081))
            ThreePointArc((9, 66.643418081), (7.939339828, 67.082757909), (7.5, 68.143418081))
            Line((7.5, 68.143418081), (7.5, 70.143418081))
            ThreePointArc((7.5, 70.143418081), (7.939339828, 71.204078252), (9, 71.643418081))
        make_face()
        with BuildLine():
            Line((9, -13.356581919), (26, -13.356581919))
            ThreePointArc((26, -13.356581919), (27.060660172, -13.795921748), (27.5, -14.856581919))
            Line((27.5, -14.856581919), (27.5, -16.856581919))
            ThreePointArc((27.5, -16.856581919), (27.060660172, -17.917242091), (26, -18.356581919))
            Line((26, -18.356581919), (9, -18.356581919))
            ThreePointArc((9, -18.356581919), (7.939339828, -17.917242091), (7.5, -16.856581919))
            Line((7.5, -16.856581919), (7.5, -14.856581919))
            ThreePointArc((7.5, -14.856581919), (7.939339828, -13.795921748), (9, -13.356581919))
        make_face()
    extrude(amount=-CUT_EXTRUDE9_DEPTH, mode=Mode.SUBTRACT)

    # Sketch19 → Boss-Extrude6 (add)
    with BuildSketch(Plane(origin=(0, 0, -45), x_dir=(-1, 0, 0), z_dir=(0, 0, -1))):
        with Locations((36.639483312, 28.41676696)):
            Rectangle(SKETCH19_W, SKETCH19_H)
    extrude(amount=BOSS_EXTRUDE6_DEPTH)


with BuildPart() as body_2:
    # Sketch16 → Boss-Extrude4 (new body)
    with BuildSketch(Plane(origin=(-60.139483312, 0, 0), x_dir=(0, 0, -1), z_dir=(1, 0, 0))):
        with Locations((22.5, 80.893418081)):
            Rectangle(SKETCH16_W, SKETCH16_H)
    extrude(amount=BOSS_EXTRUDE4_DEPTH)


solid = Compound([part.part, body_2.part])
